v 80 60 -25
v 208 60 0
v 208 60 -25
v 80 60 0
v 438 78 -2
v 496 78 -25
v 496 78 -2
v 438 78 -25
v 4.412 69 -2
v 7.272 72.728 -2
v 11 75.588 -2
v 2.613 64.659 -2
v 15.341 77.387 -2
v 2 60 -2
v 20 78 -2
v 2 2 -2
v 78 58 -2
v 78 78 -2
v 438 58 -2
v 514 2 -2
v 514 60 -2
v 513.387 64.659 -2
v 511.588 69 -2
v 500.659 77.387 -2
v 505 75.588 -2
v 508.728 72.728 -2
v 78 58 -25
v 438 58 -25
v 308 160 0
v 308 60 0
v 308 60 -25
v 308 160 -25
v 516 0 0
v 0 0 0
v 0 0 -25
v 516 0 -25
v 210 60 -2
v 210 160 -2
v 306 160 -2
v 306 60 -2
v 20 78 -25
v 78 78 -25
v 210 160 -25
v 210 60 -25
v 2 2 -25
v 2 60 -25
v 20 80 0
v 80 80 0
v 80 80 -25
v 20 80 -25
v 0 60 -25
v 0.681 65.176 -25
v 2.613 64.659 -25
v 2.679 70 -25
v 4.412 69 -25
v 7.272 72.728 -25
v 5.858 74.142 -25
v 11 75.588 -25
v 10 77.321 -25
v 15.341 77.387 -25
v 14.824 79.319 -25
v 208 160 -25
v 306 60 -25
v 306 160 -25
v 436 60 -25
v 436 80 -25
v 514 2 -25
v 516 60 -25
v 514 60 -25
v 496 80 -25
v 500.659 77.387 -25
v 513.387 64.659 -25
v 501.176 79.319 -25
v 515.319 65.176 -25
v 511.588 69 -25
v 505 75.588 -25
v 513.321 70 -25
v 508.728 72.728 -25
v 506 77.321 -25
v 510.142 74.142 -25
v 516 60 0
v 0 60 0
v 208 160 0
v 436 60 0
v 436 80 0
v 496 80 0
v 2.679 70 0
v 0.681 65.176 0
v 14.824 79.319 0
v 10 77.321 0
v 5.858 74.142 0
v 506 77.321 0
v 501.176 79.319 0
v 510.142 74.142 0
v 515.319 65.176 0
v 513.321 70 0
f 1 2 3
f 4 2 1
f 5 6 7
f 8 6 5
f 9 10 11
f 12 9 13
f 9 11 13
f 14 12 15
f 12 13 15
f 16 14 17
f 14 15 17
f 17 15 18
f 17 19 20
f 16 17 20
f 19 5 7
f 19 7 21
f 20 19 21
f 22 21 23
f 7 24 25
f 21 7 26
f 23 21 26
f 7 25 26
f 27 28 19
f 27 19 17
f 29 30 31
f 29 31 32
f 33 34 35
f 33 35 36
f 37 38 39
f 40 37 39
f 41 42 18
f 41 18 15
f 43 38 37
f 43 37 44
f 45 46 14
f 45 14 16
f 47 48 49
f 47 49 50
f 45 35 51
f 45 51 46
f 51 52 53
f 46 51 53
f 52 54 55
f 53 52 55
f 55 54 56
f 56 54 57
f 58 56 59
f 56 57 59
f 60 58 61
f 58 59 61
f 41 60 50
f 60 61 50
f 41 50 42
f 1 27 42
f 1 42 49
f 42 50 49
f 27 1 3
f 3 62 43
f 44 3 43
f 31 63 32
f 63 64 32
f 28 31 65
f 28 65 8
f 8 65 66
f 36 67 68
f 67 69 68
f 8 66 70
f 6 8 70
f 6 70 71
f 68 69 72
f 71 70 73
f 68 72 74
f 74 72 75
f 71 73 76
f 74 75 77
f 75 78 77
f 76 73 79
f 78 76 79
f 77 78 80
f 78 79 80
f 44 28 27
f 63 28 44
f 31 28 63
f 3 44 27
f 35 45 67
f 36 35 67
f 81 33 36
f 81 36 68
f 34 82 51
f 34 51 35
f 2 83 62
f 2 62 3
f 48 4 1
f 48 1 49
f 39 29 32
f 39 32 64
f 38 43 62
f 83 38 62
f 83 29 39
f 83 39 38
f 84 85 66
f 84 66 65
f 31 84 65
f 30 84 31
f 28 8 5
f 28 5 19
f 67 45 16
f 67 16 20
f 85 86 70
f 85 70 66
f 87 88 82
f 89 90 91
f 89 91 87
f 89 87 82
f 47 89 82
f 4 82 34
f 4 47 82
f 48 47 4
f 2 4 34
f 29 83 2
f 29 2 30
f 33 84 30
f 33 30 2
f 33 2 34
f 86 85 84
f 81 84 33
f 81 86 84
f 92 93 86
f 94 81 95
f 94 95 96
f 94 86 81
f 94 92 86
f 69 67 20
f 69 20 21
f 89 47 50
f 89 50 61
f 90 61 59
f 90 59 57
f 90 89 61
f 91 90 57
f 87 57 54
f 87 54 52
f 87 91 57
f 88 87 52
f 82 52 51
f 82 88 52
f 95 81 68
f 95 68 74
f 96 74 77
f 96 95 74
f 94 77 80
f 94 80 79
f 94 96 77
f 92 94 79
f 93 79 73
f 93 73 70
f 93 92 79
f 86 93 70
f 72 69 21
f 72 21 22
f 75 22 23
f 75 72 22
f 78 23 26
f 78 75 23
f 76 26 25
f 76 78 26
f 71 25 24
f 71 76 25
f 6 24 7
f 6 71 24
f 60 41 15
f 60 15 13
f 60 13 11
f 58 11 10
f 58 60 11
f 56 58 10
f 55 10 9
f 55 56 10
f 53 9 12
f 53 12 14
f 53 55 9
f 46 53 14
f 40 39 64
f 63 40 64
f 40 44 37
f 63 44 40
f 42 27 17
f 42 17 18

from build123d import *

# Parameters (mm, degrees)
BOSS_EXTRUDE1_DEPTH = 25
SKETCH2_W           = 96
SKETCH2_H           = 23
CUT_EXTRUDE1_DEPTH  = 100
SHELL3_START        = -25
SHELL3_DEPTH        = 23


# Read off the part's stored shape, not the designer's step: Shell3
with BuildPart() as part:
    # Sketch1 → Boss-Extrude1 (new body)
    with BuildSketch(Plane.XY):
        with BuildLine():
            Line((0, 0), (516, 0))
            Line((516, 0), (516, 60))
            ThreePointArc((516, 60), (510.142135624, 74.142135624), (496, 80))
            Line((496, 80), (436, 80))
            Line((436, 80), (436, 60))
            Line((436, 60), (308, 60))
            Line((308, 60), (308, 160))
            Line((308, 160), (208, 160))
            Line((208, 160), (208, 60))
            Line((208, 60), (80, 60))
            Line((80, 60), (80, 80))
            Line((80, 80), (20, 80))
            ThreePointArc((20, 80), (5.857864376, 74.142135624), (0, 60))
            Line((0, 60), (0, 0))
        make_face()
    extrude(amount=-BOSS_EXTRUDE1_DEPTH)

    # Sketch2 → Cut-Extrude1 (cut)
    with BuildSketch(Plane(origin=(0, 160, 0), x_dir=(1, 0, 0), z_dir=(0, 1, 0))):
        with Locations((258, 13.5)):
            Rectangle(SKETCH2_W, SKETCH2_H)
    extrude(amount=-CUT_EXTRUDE1_DEPTH, mode=Mode.SUBTRACT)

    # Shell3 outline → Shell3 (cut)
    with BuildSketch(Plane.XY.offset(SHELL3_START)):
        with BuildLine():
            ThreePointArc((20, 78), (7.272077939, 72.727922061), (2, 60))
            Line((2, 60), (2, 2))
            Line((2, 2), (514, 2))
            Line((514, 2), (514, 60))
            ThreePointArc((514, 60), (508.727922061, 72.727922061), (496, 78))
            Line((496, 78), (438, 78))
            Line((438, 78), (438, 58))
            Line((438, 58), (78, 58))
            Line((78, 58), (78, 78))
            Line((78, 78), (20, 78))
        make_face()
    extrude(amount=SHELL3_DEPTH, mode=Mode.SUBTRACT)


solid = part.part
